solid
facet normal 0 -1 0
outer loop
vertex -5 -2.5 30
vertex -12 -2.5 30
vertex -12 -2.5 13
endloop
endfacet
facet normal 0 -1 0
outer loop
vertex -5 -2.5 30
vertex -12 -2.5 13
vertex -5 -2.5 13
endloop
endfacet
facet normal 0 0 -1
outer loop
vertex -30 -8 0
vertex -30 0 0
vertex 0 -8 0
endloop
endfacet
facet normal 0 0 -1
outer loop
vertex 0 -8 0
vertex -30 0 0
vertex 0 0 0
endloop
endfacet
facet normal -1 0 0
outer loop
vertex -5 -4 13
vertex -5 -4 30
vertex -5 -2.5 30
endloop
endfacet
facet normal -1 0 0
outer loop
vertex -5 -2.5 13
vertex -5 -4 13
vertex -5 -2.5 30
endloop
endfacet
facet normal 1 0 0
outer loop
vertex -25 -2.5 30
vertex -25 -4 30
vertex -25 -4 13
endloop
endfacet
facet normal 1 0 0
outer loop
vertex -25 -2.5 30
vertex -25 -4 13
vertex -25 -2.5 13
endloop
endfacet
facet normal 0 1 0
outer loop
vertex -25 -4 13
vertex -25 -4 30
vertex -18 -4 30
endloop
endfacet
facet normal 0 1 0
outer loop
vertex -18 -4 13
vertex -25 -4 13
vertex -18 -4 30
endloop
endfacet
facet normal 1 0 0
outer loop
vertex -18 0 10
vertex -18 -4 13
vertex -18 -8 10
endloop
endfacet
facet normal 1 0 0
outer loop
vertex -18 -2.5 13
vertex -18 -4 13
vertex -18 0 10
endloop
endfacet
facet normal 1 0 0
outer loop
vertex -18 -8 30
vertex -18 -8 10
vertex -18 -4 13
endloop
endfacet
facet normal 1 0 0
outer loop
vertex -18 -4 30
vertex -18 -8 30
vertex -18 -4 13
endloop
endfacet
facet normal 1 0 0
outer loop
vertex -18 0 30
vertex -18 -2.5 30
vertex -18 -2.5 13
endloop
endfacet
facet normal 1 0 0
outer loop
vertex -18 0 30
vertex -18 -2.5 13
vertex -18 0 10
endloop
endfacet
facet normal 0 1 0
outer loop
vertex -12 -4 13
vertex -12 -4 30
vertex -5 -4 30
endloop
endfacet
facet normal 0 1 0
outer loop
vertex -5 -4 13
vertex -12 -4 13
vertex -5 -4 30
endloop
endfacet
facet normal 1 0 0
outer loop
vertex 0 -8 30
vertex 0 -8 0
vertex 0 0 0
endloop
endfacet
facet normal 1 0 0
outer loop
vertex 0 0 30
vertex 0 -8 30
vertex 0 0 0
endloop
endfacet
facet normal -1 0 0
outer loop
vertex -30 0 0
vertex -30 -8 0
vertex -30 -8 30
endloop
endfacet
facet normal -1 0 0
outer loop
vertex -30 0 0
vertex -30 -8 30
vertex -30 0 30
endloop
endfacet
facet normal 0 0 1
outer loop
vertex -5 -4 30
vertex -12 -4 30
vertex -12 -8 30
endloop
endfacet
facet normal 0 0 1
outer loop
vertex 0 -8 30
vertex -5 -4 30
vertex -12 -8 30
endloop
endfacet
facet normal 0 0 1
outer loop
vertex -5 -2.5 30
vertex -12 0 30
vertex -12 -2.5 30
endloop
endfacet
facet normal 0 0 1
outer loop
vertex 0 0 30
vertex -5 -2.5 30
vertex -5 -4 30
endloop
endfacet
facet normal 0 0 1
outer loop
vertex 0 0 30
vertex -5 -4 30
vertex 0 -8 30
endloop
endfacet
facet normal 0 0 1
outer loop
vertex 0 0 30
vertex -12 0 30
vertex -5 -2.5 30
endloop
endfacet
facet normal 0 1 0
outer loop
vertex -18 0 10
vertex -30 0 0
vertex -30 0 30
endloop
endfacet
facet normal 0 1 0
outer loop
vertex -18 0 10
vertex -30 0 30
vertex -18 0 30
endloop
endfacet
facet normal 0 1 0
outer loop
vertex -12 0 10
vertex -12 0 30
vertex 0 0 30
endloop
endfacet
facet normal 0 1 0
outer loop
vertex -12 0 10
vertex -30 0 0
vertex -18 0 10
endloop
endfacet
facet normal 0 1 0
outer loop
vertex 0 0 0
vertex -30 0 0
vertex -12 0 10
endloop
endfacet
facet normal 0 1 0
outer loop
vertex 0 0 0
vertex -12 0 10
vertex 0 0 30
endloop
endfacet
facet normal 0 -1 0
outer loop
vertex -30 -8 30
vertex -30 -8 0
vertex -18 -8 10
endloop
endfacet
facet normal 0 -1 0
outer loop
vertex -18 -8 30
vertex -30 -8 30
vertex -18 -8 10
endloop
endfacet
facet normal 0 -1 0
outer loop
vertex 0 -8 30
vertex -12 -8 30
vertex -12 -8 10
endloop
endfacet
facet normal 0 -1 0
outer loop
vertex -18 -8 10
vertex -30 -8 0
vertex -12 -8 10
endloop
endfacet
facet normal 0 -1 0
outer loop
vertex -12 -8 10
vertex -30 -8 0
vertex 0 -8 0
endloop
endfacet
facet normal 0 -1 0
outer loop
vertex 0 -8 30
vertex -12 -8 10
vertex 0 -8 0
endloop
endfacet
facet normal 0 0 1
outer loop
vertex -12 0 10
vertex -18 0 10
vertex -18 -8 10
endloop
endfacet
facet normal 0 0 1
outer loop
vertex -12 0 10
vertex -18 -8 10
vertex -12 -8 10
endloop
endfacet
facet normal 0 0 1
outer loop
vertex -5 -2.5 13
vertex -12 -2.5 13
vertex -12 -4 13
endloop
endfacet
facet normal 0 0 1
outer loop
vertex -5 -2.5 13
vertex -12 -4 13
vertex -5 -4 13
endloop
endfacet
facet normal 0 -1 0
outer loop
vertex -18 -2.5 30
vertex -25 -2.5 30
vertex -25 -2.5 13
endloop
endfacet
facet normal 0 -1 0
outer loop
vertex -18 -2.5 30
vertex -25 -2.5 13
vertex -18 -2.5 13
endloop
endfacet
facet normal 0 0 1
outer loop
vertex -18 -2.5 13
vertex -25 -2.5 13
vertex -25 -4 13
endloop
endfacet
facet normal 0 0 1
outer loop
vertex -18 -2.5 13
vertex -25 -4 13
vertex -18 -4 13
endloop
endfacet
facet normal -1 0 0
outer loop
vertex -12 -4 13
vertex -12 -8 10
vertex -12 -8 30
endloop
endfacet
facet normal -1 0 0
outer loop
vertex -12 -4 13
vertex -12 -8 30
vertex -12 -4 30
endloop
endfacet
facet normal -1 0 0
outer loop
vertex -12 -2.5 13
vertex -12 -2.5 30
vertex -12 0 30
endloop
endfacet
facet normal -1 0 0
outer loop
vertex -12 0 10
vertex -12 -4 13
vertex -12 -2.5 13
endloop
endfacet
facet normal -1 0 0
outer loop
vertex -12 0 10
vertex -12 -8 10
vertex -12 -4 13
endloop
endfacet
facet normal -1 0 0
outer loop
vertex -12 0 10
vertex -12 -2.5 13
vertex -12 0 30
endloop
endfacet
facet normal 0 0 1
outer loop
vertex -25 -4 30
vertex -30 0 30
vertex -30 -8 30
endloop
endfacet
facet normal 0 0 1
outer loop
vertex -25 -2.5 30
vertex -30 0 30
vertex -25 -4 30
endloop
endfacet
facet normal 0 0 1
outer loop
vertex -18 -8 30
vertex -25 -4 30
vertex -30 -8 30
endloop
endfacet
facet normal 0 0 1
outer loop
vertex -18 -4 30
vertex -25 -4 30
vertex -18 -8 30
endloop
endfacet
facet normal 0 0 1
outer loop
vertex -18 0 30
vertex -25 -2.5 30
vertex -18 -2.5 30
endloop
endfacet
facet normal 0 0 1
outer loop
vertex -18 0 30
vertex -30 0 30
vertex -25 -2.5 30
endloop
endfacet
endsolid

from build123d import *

# Parameters (mm, degrees)
F0_W     = 30
F0_H     = 8
F1_DEPTH = 30
F3_W     = 6
F3_H     = 2.5
F3_H_2   = 4
F4_DEPTH = 20
F2_W     = 20
F2_H     = 1.5
F5_DEPTH = 20
F6_W     = 7
F6_H     = 1.5
F7_DEPTH = 3


with BuildPart() as f1:
    # F0 (on Top) → F1 (new body)
    with BuildSketch(Plane.XY):
        with Locations((-15, -4)):
            Rectangle(F0_W, F0_H)
    extrude(amount=F1_DEPTH)

    # F3 (on face) → F4 (cut)
    with BuildSketch(Plane.XY.offset(30)):
        with Locations((-15, -1.25)):
            Rectangle(F3_W, F3_H)
        with Locations((-15, -6)):
            Rectangle(F3_W, F3_H_2)
    extrude(amount=-F4_DEPTH, mode=Mode.SUBTRACT)

    # F2 (on face) → F5 (cut)
    with BuildSketch(Plane.XY.offset(30)):
        with Locations((-15, -3.25)):
            Rectangle(F2_W, F2_H)
    extrude(amount=-F5_DEPTH, mode=Mode.SUBTRACT)

    # F6 (on face) → F7 (join)
    with BuildSketch(Plane.XY.offset(10)):
        with Locations((-8.5, -3.25)):
            Rectangle(F6_W, F6_H)
        with Locations((-21.5, -3.25)):
            Rectangle(F6_W, F6_H)
    extrude(amount=F7_DEPTH)


solid = f1.part
